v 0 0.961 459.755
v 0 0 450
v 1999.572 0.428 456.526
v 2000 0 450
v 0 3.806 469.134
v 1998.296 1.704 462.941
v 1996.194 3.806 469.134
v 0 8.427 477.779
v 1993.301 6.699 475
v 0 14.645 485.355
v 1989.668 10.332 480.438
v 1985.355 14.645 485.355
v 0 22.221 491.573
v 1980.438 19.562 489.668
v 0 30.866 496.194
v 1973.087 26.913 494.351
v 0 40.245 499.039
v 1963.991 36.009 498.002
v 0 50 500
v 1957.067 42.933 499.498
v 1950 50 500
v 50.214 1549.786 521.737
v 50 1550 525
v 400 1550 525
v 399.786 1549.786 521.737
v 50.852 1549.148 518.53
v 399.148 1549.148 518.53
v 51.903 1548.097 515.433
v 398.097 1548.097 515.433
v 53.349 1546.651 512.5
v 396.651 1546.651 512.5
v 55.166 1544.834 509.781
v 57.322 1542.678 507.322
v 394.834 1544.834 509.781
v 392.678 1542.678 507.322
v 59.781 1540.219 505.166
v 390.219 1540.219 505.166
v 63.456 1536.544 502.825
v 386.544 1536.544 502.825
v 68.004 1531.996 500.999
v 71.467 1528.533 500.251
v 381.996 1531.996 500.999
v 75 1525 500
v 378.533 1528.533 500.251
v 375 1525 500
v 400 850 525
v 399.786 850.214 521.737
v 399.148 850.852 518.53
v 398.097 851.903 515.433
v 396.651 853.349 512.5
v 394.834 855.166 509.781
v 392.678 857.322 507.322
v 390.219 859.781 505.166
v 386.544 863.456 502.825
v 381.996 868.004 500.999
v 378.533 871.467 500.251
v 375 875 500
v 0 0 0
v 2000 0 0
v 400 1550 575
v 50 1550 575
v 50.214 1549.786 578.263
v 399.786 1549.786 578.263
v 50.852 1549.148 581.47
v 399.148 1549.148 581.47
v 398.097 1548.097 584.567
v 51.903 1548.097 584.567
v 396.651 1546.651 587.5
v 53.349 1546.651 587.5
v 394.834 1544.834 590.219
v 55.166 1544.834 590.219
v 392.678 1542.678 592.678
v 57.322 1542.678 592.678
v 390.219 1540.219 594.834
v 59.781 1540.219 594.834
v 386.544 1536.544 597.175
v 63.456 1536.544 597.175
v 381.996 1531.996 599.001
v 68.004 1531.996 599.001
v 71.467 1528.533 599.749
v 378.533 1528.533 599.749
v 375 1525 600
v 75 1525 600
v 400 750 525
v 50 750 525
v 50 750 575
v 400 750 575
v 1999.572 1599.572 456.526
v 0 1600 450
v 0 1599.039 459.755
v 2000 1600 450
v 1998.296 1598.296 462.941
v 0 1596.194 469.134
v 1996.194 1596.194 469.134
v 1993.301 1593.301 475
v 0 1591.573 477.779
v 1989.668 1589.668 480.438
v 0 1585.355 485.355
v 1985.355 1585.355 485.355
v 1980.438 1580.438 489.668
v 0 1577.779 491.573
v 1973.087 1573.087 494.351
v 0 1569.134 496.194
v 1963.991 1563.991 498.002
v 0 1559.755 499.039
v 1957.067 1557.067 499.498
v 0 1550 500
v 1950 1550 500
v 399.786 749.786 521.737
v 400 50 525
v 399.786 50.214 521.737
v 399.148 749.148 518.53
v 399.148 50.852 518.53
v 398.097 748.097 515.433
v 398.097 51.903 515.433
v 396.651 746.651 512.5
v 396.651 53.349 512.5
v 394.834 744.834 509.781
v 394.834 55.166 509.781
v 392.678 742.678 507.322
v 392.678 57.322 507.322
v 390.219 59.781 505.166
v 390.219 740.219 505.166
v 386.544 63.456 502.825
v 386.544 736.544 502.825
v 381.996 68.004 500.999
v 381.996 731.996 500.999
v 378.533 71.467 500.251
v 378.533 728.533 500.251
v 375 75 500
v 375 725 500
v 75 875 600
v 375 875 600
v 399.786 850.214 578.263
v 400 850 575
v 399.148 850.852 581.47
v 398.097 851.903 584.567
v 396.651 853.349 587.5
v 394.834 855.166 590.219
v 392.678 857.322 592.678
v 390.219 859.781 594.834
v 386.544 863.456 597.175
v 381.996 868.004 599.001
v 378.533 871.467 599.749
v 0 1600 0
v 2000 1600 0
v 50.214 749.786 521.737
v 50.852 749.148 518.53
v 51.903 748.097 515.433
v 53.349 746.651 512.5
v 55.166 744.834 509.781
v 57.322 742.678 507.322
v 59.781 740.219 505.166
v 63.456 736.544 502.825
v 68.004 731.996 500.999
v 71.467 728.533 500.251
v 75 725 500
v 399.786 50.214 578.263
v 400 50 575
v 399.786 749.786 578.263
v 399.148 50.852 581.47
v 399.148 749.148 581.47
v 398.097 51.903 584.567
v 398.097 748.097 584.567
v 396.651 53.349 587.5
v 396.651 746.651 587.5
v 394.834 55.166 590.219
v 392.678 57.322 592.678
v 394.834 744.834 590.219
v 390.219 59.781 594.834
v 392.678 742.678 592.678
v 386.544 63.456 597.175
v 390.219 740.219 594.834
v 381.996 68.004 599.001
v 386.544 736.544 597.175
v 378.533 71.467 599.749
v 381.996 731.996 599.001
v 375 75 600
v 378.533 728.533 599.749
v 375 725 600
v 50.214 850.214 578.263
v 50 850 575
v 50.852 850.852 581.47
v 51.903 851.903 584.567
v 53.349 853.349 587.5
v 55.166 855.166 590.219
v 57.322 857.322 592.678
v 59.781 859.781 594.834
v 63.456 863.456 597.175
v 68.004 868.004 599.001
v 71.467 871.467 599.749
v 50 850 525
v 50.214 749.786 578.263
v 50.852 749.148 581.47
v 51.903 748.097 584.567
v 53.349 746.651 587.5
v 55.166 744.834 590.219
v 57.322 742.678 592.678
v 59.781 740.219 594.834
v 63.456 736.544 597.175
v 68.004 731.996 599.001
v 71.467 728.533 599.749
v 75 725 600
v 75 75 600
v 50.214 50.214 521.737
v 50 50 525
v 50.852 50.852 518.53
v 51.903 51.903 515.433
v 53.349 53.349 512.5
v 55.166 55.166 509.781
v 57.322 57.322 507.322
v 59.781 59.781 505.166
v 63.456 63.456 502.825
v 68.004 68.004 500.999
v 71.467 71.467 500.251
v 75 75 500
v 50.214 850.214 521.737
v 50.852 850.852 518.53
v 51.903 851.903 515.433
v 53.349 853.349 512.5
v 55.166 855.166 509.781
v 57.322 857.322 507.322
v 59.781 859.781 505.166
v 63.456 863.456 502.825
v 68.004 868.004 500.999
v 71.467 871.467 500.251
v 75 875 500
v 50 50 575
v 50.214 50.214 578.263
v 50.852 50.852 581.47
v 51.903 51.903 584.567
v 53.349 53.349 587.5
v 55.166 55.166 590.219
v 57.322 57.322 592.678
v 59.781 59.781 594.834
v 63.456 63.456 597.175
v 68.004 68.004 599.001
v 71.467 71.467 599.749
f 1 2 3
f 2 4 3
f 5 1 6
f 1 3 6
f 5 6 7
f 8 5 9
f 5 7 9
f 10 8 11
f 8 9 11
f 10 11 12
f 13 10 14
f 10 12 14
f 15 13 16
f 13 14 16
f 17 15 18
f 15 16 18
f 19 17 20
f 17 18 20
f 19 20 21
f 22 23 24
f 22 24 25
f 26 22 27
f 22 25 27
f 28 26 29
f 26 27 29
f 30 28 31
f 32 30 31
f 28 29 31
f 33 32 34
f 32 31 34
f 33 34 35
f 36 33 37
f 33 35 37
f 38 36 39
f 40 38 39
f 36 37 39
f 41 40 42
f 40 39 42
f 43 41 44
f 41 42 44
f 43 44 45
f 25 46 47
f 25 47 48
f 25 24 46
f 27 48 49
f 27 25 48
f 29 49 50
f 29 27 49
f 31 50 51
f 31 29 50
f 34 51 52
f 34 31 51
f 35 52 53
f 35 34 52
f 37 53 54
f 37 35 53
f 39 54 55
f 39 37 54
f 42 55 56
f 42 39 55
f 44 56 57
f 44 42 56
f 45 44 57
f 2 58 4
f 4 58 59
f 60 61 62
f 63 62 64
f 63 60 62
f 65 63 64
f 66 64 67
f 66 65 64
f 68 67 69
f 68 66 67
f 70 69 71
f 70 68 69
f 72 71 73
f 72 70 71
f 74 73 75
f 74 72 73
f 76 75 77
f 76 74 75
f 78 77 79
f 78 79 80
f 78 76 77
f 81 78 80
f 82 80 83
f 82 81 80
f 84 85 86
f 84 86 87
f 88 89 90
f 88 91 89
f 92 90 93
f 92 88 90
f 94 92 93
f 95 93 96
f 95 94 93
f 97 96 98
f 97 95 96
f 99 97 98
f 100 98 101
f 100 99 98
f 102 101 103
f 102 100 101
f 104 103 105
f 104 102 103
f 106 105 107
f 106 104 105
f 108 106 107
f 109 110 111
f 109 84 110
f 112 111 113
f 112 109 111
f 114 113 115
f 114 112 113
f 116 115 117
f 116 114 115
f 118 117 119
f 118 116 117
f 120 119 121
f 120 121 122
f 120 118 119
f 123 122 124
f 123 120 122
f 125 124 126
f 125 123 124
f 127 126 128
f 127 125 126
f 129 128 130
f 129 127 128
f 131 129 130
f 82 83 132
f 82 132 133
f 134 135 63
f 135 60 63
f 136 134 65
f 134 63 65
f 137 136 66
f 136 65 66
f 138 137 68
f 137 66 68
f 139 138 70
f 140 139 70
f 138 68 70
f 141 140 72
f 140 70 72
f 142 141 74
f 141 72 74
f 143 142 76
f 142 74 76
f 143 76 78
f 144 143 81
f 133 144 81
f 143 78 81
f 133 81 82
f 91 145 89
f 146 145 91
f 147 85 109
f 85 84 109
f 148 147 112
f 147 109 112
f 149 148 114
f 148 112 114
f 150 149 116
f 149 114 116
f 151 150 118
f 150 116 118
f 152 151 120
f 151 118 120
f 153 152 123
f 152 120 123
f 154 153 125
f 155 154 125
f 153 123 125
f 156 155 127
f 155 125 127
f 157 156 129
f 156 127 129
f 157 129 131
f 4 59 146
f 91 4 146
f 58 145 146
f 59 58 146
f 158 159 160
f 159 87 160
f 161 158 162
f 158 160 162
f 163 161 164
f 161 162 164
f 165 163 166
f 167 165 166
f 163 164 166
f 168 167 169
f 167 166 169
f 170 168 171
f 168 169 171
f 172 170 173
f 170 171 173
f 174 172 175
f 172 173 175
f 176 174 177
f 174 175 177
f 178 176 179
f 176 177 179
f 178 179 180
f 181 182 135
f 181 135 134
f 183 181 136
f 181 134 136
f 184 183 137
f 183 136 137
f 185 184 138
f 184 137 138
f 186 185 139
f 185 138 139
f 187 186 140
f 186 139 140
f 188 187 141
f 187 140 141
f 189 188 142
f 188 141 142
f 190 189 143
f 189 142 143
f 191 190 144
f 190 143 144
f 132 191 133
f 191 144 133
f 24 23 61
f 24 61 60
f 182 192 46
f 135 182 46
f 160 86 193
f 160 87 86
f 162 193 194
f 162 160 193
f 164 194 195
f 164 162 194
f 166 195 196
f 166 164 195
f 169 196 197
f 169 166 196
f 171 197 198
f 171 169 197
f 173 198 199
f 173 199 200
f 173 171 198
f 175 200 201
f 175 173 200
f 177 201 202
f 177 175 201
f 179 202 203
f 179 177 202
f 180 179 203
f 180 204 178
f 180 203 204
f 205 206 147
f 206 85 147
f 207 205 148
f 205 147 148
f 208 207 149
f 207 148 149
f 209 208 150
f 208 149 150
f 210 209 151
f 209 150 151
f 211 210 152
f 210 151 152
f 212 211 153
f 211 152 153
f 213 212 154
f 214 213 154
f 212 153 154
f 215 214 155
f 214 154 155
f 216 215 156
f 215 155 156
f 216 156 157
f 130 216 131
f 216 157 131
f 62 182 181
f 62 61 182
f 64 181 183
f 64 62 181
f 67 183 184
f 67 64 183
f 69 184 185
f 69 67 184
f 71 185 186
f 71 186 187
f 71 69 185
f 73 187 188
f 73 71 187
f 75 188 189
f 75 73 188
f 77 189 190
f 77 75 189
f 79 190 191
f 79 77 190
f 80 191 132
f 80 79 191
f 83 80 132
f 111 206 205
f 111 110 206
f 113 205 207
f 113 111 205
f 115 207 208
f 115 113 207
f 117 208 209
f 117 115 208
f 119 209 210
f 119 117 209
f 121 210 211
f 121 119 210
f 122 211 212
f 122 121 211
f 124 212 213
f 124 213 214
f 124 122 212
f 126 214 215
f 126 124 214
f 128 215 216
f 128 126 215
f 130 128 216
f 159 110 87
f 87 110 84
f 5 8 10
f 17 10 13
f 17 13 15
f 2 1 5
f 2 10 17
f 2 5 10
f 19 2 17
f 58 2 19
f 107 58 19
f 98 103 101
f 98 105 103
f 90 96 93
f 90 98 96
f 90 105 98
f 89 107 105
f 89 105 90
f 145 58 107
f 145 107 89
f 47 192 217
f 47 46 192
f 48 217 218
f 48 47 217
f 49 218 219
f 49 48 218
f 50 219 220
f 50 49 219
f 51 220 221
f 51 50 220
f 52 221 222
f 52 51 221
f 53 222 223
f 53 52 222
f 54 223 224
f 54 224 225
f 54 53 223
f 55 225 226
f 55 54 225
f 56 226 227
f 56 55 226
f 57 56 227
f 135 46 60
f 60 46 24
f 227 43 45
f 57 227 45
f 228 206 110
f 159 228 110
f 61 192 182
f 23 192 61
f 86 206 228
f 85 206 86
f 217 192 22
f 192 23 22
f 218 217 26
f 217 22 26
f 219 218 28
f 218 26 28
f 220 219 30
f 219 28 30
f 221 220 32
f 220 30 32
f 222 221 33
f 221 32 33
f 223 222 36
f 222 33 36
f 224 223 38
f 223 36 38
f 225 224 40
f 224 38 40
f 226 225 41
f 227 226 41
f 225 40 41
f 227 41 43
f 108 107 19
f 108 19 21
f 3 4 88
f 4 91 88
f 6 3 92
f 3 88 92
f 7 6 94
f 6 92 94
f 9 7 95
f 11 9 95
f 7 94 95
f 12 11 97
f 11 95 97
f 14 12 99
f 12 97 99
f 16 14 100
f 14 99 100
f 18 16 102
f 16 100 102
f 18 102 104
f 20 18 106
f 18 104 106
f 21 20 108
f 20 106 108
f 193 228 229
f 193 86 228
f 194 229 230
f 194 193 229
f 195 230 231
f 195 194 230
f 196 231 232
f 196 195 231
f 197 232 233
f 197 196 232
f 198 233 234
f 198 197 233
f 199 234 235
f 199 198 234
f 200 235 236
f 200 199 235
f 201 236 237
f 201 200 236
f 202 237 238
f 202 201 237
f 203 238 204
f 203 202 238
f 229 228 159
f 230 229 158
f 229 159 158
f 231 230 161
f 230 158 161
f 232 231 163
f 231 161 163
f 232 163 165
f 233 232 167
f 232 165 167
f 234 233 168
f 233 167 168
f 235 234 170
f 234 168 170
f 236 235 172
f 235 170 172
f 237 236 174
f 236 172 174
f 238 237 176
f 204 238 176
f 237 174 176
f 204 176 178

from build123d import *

# Parameters (mm, degrees)
F0_W     = 2000
F0_H     = 1600
F1_DEPTH = 500
F2_W     = 350
F2_H     = 700
F3_DEPTH = 100
F4_R     = 25
F5_R     = 50


with BuildPart() as f1:
    # F0 (on Top) → F1 (new body)
    with BuildSketch(Plane.XY):
        with Locations((1000, 800)):
            Rectangle(F0_W, F0_H)
    extrude(amount=F1_DEPTH)

    # F5
    f5_edges = [f1.edges().sort_by_distance(p)[0] for p in [
        (1000, 0, 500),
        (2000, 800, 500),
        (1000, 1600, 500),
    ]]
    fillet(f5_edges, radius=F5_R)


with BuildPart() as f3:
    # F2 (on face) → F3 (new body)
    with BuildSketch(Plane.XY.offset(500)):
        with Locations((225, 400)):
            Rectangle(F2_W, F2_H)
        with Locations((225, 1200)):
            Rectangle(F2_W, F2_H)
    extrude(amount=F3_DEPTH)

    # F4
    f4_edges = [f3.edges().sort_by_distance(p)[0] for p in [
        (225, 50, 600),
        (50, 400, 600),
        (225, 750, 600),
        (400, 400, 600),
        (225, 50, 500),
        (400, 400, 500),
        (50, 400, 500),
        (225, 750, 500),
        (50, 1200, 600),
        (225, 850, 600),
        (400, 1200, 600),
        (225, 1550, 600),
        (50, 1200, 500),
        (225, 850, 500),
        (225, 1550, 500),
        (400, 1200, 500),
    ]]
    fillet(f4_edges, radius=F4_R)


solid = Compound([f1.part, f3.part])
